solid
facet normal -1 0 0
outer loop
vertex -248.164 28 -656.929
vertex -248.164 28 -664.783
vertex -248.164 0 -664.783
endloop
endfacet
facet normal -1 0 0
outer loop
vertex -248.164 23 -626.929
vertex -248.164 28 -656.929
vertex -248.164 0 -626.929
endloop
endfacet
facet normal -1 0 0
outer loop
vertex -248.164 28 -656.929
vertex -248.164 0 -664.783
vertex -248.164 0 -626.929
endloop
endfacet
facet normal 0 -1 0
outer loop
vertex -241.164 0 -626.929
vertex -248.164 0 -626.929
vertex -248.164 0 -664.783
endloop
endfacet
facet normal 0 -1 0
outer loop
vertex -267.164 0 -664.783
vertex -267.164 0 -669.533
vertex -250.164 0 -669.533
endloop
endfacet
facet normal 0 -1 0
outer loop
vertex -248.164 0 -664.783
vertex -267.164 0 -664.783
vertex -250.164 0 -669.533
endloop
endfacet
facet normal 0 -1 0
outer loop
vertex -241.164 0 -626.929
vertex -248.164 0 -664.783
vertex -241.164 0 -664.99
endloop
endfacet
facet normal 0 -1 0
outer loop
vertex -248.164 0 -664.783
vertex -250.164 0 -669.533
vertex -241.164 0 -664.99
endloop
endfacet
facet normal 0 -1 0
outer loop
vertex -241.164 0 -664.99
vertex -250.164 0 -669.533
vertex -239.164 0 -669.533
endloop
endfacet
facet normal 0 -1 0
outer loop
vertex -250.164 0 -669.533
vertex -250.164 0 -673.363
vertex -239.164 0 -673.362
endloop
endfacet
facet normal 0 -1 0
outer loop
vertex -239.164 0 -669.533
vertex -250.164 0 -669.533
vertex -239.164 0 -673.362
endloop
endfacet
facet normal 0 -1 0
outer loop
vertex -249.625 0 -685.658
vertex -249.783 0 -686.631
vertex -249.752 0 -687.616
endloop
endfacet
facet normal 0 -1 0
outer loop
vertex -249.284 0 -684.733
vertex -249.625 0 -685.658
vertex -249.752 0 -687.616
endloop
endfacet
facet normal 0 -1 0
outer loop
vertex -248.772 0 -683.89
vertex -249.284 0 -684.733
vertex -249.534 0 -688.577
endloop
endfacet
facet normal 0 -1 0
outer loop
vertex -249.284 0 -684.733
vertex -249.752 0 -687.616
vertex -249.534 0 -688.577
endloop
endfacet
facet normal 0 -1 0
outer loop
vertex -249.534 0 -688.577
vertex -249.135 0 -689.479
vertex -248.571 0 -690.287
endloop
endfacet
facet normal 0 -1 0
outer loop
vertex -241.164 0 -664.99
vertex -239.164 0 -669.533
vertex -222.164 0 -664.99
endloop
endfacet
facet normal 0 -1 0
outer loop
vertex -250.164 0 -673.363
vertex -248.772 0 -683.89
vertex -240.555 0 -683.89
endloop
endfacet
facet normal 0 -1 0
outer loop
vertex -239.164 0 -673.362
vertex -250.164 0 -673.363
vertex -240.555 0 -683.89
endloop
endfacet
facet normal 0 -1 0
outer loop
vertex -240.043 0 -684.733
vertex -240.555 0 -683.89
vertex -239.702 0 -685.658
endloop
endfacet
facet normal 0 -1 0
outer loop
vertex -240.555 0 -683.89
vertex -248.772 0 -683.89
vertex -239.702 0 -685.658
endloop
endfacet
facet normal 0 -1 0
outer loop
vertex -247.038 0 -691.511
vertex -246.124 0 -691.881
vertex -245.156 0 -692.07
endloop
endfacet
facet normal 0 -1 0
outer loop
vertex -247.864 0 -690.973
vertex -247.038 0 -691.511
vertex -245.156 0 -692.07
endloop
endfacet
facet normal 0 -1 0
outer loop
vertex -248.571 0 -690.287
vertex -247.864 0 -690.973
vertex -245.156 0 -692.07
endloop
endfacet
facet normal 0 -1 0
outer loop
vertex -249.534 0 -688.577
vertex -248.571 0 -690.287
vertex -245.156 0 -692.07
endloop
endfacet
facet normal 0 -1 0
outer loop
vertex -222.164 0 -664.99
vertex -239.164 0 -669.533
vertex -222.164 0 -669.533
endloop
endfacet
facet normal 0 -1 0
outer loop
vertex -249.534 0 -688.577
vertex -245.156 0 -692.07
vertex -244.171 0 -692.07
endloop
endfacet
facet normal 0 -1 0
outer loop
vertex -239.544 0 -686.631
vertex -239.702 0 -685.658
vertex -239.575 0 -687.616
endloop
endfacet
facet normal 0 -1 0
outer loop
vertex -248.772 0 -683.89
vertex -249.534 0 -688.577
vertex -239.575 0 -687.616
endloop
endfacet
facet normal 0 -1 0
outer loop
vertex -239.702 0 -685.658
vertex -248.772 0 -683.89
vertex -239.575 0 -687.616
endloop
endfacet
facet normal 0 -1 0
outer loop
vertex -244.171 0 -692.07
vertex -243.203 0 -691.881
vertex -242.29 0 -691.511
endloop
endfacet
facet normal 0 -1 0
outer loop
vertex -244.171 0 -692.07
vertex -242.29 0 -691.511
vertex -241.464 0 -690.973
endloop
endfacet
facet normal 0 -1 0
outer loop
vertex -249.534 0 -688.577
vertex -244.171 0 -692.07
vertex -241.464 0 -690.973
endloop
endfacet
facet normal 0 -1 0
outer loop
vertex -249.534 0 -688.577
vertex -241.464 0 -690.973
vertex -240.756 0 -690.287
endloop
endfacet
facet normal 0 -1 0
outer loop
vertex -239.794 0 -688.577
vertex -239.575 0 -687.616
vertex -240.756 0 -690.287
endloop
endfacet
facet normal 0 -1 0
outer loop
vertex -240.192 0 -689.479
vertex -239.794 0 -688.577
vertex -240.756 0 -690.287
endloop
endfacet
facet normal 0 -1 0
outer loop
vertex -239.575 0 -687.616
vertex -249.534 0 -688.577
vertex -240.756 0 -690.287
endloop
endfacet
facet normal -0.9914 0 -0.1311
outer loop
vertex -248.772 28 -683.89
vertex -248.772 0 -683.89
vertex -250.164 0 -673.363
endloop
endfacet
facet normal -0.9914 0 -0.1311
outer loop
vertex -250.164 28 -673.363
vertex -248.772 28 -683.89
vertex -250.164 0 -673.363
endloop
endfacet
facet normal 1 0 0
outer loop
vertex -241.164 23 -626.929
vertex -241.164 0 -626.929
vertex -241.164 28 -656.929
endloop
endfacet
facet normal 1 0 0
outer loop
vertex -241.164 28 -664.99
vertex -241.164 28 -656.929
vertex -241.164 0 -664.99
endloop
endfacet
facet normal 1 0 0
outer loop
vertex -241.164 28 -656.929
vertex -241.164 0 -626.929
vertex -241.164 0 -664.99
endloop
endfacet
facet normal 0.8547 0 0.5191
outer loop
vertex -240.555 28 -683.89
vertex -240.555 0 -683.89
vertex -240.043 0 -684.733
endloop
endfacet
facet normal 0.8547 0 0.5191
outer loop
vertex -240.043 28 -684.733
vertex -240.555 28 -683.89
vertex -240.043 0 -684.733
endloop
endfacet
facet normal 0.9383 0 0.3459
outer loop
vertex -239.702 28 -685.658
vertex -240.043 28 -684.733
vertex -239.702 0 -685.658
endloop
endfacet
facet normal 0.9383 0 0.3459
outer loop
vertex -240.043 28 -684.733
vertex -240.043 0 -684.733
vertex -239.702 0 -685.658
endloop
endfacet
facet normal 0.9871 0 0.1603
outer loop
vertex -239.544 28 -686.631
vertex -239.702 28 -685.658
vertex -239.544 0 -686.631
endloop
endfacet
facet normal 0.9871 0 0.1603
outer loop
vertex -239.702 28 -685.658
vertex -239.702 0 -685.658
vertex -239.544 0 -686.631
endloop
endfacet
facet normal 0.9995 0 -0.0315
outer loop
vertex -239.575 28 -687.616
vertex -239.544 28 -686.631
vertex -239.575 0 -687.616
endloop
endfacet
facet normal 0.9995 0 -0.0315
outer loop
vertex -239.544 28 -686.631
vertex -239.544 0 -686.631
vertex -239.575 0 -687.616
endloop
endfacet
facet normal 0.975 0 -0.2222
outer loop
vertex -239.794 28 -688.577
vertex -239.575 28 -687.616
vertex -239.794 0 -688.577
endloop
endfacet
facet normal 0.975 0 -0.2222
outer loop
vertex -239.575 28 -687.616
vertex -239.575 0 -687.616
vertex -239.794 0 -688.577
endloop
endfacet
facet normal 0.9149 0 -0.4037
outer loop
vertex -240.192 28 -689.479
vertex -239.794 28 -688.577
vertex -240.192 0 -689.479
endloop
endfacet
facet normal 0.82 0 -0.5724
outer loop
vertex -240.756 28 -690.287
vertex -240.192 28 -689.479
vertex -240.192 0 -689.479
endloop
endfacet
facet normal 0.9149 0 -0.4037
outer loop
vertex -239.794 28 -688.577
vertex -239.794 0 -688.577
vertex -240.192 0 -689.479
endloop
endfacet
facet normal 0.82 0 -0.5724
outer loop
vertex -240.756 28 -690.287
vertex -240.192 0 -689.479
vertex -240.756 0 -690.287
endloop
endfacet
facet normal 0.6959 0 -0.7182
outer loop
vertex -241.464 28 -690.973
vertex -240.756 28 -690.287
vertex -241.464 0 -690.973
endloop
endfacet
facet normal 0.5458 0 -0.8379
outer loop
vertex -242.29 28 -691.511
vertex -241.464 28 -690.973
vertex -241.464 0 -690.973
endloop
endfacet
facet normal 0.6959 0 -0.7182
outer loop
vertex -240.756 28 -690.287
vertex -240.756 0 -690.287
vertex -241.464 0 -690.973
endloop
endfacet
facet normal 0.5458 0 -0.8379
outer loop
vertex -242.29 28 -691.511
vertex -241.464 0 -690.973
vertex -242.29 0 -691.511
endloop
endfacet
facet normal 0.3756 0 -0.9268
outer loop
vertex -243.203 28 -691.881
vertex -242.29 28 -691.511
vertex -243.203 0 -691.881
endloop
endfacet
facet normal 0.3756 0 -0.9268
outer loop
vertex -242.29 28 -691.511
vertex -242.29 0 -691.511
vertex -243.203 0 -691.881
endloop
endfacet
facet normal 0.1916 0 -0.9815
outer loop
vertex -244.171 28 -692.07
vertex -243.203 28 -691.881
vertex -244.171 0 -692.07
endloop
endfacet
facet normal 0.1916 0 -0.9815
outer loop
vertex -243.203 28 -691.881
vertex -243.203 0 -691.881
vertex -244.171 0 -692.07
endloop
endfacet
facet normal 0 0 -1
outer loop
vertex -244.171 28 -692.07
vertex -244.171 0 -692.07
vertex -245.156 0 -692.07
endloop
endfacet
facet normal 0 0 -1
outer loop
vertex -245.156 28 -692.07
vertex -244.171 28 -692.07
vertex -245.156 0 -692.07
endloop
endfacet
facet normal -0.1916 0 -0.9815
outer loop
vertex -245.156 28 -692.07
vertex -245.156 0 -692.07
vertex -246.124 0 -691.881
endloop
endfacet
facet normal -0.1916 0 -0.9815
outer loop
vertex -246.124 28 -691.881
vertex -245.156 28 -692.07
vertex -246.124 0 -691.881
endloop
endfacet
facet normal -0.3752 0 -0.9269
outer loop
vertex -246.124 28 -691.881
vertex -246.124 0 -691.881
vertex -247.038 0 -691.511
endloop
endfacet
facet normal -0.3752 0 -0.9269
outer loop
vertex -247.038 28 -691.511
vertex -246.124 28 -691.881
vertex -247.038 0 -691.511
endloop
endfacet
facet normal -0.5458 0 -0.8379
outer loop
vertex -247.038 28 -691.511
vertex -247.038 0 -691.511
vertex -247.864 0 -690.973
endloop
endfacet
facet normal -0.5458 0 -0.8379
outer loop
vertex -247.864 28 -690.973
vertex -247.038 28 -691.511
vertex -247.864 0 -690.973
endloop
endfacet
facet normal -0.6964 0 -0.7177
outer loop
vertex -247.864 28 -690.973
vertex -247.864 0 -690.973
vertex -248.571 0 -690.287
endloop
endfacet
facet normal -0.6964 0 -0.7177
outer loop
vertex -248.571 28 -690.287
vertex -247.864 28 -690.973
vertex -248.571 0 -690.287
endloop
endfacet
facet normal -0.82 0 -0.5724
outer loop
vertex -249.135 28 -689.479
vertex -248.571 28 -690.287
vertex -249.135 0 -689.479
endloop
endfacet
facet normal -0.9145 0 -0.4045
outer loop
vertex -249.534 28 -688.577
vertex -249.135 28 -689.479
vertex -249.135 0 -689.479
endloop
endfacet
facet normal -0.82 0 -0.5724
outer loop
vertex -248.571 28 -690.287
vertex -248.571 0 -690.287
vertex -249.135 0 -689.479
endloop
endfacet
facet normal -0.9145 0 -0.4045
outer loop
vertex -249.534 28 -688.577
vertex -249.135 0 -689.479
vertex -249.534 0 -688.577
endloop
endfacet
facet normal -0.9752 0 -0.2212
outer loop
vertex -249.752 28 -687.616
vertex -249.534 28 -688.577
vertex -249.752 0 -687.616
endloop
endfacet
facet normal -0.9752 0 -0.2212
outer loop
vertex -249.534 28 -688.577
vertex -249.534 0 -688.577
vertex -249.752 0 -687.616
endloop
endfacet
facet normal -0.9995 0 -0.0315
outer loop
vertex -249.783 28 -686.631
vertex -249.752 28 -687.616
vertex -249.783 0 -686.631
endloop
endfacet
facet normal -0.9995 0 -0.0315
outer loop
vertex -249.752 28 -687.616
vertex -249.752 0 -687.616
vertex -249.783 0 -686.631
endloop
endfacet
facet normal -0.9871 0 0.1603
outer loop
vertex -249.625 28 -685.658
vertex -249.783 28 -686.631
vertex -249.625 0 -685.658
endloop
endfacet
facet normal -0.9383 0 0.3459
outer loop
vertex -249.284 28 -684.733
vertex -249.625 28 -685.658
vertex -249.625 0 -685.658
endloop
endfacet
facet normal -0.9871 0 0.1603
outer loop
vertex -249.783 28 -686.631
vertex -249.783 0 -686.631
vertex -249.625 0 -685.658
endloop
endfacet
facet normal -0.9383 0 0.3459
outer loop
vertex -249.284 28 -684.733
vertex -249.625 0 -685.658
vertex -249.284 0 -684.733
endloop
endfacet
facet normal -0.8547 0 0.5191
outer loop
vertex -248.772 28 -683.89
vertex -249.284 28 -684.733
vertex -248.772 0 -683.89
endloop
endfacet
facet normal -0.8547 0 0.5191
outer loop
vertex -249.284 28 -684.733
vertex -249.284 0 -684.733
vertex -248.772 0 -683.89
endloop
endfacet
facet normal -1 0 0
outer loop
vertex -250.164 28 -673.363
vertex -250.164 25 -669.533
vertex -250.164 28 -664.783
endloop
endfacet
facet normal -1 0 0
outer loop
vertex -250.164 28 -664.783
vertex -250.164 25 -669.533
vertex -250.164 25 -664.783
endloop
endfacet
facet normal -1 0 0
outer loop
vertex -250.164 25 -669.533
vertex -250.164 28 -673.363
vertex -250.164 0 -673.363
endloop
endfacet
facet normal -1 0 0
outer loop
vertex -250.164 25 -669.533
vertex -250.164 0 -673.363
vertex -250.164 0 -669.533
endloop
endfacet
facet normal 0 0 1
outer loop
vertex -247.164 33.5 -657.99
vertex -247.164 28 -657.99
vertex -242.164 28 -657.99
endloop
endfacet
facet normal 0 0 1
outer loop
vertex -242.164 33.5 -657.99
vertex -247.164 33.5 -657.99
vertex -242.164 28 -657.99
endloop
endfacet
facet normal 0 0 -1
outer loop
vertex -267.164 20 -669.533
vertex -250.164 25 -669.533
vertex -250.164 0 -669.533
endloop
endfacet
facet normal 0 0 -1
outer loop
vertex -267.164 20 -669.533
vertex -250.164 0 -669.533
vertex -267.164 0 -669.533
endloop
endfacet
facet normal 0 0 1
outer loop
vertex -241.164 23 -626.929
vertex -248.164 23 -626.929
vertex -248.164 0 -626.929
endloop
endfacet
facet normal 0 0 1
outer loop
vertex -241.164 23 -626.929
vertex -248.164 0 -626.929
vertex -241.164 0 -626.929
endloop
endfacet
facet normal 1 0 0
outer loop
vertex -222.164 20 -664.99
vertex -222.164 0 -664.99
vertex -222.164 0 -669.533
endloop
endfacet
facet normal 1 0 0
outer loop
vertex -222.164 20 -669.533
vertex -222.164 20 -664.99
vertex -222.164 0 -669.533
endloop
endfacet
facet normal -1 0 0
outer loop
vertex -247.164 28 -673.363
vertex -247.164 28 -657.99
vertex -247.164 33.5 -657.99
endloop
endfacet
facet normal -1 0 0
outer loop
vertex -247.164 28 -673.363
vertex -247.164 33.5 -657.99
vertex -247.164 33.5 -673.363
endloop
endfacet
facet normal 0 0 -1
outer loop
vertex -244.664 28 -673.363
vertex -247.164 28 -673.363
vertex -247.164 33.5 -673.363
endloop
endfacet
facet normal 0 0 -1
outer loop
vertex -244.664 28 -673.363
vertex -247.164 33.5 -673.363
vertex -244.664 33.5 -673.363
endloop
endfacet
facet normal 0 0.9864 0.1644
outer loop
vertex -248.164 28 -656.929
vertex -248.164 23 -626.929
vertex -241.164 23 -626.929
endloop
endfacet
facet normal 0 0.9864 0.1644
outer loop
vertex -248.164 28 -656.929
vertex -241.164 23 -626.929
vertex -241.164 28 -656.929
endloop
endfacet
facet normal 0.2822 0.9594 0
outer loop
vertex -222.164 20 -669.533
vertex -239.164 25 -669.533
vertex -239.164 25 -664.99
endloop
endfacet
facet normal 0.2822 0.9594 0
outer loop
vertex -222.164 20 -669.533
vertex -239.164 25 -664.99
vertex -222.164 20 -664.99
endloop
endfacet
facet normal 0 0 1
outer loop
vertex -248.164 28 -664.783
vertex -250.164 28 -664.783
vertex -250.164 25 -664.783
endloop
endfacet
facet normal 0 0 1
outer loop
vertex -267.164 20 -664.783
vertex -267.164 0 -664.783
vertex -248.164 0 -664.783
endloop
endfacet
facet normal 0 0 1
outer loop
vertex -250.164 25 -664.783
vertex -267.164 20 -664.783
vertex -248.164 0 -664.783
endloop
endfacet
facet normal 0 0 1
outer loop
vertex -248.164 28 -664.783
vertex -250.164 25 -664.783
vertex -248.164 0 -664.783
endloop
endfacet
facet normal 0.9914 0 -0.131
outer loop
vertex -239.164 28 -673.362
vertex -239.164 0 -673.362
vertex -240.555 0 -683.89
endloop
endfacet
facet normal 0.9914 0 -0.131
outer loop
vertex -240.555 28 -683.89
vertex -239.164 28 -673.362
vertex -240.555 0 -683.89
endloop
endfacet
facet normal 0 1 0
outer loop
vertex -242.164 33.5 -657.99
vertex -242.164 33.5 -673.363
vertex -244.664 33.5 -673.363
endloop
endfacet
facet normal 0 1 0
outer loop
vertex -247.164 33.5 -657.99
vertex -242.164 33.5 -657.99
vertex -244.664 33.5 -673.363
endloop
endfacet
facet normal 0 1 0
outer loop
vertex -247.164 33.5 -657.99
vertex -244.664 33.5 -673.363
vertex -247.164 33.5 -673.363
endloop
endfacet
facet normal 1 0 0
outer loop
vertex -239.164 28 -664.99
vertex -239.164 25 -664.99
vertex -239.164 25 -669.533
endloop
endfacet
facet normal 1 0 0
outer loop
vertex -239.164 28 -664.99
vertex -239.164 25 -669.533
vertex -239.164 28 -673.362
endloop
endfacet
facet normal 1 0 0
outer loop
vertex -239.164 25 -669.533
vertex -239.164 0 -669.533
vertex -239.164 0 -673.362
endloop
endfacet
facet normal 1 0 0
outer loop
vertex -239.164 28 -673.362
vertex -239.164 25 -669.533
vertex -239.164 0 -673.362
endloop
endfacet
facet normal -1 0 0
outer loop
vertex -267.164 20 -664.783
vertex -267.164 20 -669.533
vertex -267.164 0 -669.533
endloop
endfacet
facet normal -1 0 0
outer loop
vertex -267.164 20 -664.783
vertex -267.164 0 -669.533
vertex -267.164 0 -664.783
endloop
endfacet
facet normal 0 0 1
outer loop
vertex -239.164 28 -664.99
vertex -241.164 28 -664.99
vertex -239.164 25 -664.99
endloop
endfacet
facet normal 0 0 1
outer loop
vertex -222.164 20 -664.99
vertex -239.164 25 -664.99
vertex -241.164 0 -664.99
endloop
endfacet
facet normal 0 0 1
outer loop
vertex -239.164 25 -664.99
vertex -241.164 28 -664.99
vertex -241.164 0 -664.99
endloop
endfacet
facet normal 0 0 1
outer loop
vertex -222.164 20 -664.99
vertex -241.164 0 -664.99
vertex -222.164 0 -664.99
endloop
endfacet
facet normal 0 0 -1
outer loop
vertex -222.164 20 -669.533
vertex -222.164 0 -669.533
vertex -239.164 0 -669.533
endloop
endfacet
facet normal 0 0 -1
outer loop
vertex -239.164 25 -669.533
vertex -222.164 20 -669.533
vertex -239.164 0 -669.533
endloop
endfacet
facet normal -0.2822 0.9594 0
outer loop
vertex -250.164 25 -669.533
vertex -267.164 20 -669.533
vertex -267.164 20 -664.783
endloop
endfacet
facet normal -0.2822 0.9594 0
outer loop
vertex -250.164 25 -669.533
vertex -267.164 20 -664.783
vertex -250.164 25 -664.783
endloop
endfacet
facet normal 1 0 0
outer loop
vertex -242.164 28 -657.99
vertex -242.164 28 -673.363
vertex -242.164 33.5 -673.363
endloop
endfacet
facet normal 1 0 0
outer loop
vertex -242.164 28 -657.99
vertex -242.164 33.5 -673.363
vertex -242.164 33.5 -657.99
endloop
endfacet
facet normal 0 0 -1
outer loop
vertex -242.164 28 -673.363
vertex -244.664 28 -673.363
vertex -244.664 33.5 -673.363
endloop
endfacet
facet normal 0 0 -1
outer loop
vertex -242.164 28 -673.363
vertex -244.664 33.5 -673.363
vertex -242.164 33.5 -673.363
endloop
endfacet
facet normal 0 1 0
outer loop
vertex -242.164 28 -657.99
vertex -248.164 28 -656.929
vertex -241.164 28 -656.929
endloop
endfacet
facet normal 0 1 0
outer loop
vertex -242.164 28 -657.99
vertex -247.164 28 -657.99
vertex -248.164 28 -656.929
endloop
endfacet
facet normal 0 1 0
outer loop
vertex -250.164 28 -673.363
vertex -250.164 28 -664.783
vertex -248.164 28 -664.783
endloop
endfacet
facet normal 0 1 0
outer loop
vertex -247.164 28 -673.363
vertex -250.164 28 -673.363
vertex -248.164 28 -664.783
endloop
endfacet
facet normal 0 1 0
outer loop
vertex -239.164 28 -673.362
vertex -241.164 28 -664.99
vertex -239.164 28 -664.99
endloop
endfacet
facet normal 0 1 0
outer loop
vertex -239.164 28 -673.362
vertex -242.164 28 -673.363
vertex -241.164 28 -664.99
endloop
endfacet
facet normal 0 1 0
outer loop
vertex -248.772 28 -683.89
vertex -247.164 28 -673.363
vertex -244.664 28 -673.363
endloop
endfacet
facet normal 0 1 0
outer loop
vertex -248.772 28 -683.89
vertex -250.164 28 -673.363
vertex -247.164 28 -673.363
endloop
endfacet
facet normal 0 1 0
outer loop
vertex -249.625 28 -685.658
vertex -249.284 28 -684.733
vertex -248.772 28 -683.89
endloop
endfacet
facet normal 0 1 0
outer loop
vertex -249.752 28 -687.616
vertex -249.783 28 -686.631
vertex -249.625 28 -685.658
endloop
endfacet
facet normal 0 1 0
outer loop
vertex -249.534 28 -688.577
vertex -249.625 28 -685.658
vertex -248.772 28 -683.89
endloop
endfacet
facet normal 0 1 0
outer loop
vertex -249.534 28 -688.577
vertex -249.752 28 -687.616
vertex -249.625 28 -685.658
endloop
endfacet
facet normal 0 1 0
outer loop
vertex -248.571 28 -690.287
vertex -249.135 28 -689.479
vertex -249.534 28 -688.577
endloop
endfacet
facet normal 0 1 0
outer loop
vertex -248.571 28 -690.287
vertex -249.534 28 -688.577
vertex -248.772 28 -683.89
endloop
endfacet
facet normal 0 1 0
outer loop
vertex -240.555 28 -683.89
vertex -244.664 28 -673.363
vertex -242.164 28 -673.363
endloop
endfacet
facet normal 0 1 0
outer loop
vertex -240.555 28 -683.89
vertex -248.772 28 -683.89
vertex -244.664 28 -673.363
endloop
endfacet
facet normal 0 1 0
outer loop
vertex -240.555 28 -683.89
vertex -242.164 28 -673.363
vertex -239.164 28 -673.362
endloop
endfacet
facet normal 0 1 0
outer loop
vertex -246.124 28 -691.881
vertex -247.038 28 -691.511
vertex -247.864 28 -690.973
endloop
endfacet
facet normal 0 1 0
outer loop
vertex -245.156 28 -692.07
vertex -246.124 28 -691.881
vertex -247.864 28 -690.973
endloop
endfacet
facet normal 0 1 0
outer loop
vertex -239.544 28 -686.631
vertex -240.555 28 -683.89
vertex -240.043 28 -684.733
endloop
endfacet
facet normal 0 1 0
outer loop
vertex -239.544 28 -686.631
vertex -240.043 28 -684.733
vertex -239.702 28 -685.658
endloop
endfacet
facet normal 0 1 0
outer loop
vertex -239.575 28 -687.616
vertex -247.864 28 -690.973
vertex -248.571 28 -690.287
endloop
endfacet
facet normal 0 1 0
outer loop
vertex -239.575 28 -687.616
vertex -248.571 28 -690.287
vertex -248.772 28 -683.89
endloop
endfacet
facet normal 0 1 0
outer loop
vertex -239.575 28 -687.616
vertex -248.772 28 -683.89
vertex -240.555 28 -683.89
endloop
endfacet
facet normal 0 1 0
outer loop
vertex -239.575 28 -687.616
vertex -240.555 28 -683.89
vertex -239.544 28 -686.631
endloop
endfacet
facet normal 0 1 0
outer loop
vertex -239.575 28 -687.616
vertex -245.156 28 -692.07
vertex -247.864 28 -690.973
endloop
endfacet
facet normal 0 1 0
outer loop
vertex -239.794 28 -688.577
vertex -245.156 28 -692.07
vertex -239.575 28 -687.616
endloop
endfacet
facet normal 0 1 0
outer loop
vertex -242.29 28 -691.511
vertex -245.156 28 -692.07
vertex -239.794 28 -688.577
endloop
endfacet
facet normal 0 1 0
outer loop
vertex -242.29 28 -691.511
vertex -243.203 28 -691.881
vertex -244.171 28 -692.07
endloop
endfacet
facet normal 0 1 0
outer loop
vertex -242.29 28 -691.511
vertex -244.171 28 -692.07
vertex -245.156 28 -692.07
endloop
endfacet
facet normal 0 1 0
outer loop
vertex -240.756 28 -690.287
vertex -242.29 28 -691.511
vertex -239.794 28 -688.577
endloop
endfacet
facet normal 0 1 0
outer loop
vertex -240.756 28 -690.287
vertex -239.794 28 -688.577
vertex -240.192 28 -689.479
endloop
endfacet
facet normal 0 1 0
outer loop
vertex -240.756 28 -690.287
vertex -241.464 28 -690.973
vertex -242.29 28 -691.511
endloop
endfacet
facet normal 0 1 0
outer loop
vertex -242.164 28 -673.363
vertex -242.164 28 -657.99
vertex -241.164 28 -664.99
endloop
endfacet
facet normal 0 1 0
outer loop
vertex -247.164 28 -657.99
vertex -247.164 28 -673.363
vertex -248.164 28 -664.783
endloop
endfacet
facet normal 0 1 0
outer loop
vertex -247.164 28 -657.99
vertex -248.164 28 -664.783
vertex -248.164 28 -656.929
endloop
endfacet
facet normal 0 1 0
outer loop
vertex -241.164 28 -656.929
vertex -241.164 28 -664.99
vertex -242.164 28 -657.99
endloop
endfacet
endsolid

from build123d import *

# Parameters (mm, degrees)
BOSS_EXTRUDE1_DEPTH = 28
BOSS_EXTRUDE2_DEPTH = 5.5
CUT_EXTRUDE1_DEPTH  = 5.5
CUT_EXTRUDE2_DEPTH  = 8


with BuildPart() as part:
    # Sketch2 → Boss-Extrude1 (new body)
    with BuildSketch(Plane(origin=(0, 0, 0), x_dir=(1, 0, 0), z_dir=(0, 1, 0))):
        with BuildLine():
            Line((-248.771987083, 683.890458256), (-250.163612926, 673.36336753))
            Line((-250.163612926, 673.36336753), (-250.163612926, 669.53336753))
            Line((-250.163612926, 669.53336753), (-267.163612926, 669.53336753))
            Line((-267.163612926, 669.53336753), (-267.163612926, 664.78336753))
            Line((-267.163612926, 664.78336753), (-248.163612926, 664.78336753))
            Line((-248.163612926, 664.78336753), (-248.163612926, 626.928572815))
            Line((-248.163612926, 626.928572815), (-244.663612926, 626.928572815))
            Line((-244.663612926, 626.928572815), (-241.163612926, 626.928572815))
            Line((-241.163612926, 626.928572815), (-241.163612926, 664.990338865))
            Line((-241.163612926, 664.990338865), (-222.163612926, 664.990338865))
            Line((-222.163612926, 664.990338865), (-222.163612926, 669.53336753))
            Line((-222.163612926, 669.53336753), (-239.163612926, 669.53336753))
            Line((-239.163612926, 669.53336753), (-239.163612926, 673.362411263))
            Line((-239.163612926, 673.362411263), (-240.55523877, 683.890458256))
            ThreePointArc((-240.55523877, 683.890458256), (-244.663612926, 692.093561911), (-248.771987083, 683.890458256))
        make_face()
    extrude(amount=BOSS_EXTRUDE1_DEPTH)

    # Sketch6 → Boss-Extrude2 (add)
    with BuildSketch(Plane(origin=(0, 28, 0), x_dir=(1, 0, 0), z_dir=(0, 1, 0))):
        Polygon((-244.663612926, 673.362889397), (-242.163612926, 673.362889397), (-242.163612926, 657.990338865), (-244.663612926, 657.990338865), (-247.163612926, 657.990338865), (-247.163612926, 673.36310673), align=None)
    extrude(amount=BOSS_EXTRUDE2_DEPTH)

    # Sketch8 → Cut-Extrude1 (cut)
    with BuildSketch(Plane(origin=(0, 0, -669.53336753), x_dir=(-1, 0, 0), z_dir=(0, 0, -1))):
        Polygon((267.163612926, 20), (250.163612926, 25), (250.163612926, 28), (267.163612926, 28), align=None)
        Polygon((222.163612926, 20), (222.163612926, 28), (239.163612926, 28), (239.163612926, 25), align=None)
    extrude(amount=-CUT_EXTRUDE1_DEPTH, mode=Mode.SUBTRACT)

    # Sketch9 → Cut-Extrude2 (cut)
    with BuildSketch(Plane.ZY.offset(248.163612926)):
        Polygon((-626.928572815, 28), (-626.928572815, 23), (-656.928572815, 28), align=None)
    extrude(amount=-CUT_EXTRUDE2_DEPTH, mode=Mode.SUBTRACT)


solid = part.part
